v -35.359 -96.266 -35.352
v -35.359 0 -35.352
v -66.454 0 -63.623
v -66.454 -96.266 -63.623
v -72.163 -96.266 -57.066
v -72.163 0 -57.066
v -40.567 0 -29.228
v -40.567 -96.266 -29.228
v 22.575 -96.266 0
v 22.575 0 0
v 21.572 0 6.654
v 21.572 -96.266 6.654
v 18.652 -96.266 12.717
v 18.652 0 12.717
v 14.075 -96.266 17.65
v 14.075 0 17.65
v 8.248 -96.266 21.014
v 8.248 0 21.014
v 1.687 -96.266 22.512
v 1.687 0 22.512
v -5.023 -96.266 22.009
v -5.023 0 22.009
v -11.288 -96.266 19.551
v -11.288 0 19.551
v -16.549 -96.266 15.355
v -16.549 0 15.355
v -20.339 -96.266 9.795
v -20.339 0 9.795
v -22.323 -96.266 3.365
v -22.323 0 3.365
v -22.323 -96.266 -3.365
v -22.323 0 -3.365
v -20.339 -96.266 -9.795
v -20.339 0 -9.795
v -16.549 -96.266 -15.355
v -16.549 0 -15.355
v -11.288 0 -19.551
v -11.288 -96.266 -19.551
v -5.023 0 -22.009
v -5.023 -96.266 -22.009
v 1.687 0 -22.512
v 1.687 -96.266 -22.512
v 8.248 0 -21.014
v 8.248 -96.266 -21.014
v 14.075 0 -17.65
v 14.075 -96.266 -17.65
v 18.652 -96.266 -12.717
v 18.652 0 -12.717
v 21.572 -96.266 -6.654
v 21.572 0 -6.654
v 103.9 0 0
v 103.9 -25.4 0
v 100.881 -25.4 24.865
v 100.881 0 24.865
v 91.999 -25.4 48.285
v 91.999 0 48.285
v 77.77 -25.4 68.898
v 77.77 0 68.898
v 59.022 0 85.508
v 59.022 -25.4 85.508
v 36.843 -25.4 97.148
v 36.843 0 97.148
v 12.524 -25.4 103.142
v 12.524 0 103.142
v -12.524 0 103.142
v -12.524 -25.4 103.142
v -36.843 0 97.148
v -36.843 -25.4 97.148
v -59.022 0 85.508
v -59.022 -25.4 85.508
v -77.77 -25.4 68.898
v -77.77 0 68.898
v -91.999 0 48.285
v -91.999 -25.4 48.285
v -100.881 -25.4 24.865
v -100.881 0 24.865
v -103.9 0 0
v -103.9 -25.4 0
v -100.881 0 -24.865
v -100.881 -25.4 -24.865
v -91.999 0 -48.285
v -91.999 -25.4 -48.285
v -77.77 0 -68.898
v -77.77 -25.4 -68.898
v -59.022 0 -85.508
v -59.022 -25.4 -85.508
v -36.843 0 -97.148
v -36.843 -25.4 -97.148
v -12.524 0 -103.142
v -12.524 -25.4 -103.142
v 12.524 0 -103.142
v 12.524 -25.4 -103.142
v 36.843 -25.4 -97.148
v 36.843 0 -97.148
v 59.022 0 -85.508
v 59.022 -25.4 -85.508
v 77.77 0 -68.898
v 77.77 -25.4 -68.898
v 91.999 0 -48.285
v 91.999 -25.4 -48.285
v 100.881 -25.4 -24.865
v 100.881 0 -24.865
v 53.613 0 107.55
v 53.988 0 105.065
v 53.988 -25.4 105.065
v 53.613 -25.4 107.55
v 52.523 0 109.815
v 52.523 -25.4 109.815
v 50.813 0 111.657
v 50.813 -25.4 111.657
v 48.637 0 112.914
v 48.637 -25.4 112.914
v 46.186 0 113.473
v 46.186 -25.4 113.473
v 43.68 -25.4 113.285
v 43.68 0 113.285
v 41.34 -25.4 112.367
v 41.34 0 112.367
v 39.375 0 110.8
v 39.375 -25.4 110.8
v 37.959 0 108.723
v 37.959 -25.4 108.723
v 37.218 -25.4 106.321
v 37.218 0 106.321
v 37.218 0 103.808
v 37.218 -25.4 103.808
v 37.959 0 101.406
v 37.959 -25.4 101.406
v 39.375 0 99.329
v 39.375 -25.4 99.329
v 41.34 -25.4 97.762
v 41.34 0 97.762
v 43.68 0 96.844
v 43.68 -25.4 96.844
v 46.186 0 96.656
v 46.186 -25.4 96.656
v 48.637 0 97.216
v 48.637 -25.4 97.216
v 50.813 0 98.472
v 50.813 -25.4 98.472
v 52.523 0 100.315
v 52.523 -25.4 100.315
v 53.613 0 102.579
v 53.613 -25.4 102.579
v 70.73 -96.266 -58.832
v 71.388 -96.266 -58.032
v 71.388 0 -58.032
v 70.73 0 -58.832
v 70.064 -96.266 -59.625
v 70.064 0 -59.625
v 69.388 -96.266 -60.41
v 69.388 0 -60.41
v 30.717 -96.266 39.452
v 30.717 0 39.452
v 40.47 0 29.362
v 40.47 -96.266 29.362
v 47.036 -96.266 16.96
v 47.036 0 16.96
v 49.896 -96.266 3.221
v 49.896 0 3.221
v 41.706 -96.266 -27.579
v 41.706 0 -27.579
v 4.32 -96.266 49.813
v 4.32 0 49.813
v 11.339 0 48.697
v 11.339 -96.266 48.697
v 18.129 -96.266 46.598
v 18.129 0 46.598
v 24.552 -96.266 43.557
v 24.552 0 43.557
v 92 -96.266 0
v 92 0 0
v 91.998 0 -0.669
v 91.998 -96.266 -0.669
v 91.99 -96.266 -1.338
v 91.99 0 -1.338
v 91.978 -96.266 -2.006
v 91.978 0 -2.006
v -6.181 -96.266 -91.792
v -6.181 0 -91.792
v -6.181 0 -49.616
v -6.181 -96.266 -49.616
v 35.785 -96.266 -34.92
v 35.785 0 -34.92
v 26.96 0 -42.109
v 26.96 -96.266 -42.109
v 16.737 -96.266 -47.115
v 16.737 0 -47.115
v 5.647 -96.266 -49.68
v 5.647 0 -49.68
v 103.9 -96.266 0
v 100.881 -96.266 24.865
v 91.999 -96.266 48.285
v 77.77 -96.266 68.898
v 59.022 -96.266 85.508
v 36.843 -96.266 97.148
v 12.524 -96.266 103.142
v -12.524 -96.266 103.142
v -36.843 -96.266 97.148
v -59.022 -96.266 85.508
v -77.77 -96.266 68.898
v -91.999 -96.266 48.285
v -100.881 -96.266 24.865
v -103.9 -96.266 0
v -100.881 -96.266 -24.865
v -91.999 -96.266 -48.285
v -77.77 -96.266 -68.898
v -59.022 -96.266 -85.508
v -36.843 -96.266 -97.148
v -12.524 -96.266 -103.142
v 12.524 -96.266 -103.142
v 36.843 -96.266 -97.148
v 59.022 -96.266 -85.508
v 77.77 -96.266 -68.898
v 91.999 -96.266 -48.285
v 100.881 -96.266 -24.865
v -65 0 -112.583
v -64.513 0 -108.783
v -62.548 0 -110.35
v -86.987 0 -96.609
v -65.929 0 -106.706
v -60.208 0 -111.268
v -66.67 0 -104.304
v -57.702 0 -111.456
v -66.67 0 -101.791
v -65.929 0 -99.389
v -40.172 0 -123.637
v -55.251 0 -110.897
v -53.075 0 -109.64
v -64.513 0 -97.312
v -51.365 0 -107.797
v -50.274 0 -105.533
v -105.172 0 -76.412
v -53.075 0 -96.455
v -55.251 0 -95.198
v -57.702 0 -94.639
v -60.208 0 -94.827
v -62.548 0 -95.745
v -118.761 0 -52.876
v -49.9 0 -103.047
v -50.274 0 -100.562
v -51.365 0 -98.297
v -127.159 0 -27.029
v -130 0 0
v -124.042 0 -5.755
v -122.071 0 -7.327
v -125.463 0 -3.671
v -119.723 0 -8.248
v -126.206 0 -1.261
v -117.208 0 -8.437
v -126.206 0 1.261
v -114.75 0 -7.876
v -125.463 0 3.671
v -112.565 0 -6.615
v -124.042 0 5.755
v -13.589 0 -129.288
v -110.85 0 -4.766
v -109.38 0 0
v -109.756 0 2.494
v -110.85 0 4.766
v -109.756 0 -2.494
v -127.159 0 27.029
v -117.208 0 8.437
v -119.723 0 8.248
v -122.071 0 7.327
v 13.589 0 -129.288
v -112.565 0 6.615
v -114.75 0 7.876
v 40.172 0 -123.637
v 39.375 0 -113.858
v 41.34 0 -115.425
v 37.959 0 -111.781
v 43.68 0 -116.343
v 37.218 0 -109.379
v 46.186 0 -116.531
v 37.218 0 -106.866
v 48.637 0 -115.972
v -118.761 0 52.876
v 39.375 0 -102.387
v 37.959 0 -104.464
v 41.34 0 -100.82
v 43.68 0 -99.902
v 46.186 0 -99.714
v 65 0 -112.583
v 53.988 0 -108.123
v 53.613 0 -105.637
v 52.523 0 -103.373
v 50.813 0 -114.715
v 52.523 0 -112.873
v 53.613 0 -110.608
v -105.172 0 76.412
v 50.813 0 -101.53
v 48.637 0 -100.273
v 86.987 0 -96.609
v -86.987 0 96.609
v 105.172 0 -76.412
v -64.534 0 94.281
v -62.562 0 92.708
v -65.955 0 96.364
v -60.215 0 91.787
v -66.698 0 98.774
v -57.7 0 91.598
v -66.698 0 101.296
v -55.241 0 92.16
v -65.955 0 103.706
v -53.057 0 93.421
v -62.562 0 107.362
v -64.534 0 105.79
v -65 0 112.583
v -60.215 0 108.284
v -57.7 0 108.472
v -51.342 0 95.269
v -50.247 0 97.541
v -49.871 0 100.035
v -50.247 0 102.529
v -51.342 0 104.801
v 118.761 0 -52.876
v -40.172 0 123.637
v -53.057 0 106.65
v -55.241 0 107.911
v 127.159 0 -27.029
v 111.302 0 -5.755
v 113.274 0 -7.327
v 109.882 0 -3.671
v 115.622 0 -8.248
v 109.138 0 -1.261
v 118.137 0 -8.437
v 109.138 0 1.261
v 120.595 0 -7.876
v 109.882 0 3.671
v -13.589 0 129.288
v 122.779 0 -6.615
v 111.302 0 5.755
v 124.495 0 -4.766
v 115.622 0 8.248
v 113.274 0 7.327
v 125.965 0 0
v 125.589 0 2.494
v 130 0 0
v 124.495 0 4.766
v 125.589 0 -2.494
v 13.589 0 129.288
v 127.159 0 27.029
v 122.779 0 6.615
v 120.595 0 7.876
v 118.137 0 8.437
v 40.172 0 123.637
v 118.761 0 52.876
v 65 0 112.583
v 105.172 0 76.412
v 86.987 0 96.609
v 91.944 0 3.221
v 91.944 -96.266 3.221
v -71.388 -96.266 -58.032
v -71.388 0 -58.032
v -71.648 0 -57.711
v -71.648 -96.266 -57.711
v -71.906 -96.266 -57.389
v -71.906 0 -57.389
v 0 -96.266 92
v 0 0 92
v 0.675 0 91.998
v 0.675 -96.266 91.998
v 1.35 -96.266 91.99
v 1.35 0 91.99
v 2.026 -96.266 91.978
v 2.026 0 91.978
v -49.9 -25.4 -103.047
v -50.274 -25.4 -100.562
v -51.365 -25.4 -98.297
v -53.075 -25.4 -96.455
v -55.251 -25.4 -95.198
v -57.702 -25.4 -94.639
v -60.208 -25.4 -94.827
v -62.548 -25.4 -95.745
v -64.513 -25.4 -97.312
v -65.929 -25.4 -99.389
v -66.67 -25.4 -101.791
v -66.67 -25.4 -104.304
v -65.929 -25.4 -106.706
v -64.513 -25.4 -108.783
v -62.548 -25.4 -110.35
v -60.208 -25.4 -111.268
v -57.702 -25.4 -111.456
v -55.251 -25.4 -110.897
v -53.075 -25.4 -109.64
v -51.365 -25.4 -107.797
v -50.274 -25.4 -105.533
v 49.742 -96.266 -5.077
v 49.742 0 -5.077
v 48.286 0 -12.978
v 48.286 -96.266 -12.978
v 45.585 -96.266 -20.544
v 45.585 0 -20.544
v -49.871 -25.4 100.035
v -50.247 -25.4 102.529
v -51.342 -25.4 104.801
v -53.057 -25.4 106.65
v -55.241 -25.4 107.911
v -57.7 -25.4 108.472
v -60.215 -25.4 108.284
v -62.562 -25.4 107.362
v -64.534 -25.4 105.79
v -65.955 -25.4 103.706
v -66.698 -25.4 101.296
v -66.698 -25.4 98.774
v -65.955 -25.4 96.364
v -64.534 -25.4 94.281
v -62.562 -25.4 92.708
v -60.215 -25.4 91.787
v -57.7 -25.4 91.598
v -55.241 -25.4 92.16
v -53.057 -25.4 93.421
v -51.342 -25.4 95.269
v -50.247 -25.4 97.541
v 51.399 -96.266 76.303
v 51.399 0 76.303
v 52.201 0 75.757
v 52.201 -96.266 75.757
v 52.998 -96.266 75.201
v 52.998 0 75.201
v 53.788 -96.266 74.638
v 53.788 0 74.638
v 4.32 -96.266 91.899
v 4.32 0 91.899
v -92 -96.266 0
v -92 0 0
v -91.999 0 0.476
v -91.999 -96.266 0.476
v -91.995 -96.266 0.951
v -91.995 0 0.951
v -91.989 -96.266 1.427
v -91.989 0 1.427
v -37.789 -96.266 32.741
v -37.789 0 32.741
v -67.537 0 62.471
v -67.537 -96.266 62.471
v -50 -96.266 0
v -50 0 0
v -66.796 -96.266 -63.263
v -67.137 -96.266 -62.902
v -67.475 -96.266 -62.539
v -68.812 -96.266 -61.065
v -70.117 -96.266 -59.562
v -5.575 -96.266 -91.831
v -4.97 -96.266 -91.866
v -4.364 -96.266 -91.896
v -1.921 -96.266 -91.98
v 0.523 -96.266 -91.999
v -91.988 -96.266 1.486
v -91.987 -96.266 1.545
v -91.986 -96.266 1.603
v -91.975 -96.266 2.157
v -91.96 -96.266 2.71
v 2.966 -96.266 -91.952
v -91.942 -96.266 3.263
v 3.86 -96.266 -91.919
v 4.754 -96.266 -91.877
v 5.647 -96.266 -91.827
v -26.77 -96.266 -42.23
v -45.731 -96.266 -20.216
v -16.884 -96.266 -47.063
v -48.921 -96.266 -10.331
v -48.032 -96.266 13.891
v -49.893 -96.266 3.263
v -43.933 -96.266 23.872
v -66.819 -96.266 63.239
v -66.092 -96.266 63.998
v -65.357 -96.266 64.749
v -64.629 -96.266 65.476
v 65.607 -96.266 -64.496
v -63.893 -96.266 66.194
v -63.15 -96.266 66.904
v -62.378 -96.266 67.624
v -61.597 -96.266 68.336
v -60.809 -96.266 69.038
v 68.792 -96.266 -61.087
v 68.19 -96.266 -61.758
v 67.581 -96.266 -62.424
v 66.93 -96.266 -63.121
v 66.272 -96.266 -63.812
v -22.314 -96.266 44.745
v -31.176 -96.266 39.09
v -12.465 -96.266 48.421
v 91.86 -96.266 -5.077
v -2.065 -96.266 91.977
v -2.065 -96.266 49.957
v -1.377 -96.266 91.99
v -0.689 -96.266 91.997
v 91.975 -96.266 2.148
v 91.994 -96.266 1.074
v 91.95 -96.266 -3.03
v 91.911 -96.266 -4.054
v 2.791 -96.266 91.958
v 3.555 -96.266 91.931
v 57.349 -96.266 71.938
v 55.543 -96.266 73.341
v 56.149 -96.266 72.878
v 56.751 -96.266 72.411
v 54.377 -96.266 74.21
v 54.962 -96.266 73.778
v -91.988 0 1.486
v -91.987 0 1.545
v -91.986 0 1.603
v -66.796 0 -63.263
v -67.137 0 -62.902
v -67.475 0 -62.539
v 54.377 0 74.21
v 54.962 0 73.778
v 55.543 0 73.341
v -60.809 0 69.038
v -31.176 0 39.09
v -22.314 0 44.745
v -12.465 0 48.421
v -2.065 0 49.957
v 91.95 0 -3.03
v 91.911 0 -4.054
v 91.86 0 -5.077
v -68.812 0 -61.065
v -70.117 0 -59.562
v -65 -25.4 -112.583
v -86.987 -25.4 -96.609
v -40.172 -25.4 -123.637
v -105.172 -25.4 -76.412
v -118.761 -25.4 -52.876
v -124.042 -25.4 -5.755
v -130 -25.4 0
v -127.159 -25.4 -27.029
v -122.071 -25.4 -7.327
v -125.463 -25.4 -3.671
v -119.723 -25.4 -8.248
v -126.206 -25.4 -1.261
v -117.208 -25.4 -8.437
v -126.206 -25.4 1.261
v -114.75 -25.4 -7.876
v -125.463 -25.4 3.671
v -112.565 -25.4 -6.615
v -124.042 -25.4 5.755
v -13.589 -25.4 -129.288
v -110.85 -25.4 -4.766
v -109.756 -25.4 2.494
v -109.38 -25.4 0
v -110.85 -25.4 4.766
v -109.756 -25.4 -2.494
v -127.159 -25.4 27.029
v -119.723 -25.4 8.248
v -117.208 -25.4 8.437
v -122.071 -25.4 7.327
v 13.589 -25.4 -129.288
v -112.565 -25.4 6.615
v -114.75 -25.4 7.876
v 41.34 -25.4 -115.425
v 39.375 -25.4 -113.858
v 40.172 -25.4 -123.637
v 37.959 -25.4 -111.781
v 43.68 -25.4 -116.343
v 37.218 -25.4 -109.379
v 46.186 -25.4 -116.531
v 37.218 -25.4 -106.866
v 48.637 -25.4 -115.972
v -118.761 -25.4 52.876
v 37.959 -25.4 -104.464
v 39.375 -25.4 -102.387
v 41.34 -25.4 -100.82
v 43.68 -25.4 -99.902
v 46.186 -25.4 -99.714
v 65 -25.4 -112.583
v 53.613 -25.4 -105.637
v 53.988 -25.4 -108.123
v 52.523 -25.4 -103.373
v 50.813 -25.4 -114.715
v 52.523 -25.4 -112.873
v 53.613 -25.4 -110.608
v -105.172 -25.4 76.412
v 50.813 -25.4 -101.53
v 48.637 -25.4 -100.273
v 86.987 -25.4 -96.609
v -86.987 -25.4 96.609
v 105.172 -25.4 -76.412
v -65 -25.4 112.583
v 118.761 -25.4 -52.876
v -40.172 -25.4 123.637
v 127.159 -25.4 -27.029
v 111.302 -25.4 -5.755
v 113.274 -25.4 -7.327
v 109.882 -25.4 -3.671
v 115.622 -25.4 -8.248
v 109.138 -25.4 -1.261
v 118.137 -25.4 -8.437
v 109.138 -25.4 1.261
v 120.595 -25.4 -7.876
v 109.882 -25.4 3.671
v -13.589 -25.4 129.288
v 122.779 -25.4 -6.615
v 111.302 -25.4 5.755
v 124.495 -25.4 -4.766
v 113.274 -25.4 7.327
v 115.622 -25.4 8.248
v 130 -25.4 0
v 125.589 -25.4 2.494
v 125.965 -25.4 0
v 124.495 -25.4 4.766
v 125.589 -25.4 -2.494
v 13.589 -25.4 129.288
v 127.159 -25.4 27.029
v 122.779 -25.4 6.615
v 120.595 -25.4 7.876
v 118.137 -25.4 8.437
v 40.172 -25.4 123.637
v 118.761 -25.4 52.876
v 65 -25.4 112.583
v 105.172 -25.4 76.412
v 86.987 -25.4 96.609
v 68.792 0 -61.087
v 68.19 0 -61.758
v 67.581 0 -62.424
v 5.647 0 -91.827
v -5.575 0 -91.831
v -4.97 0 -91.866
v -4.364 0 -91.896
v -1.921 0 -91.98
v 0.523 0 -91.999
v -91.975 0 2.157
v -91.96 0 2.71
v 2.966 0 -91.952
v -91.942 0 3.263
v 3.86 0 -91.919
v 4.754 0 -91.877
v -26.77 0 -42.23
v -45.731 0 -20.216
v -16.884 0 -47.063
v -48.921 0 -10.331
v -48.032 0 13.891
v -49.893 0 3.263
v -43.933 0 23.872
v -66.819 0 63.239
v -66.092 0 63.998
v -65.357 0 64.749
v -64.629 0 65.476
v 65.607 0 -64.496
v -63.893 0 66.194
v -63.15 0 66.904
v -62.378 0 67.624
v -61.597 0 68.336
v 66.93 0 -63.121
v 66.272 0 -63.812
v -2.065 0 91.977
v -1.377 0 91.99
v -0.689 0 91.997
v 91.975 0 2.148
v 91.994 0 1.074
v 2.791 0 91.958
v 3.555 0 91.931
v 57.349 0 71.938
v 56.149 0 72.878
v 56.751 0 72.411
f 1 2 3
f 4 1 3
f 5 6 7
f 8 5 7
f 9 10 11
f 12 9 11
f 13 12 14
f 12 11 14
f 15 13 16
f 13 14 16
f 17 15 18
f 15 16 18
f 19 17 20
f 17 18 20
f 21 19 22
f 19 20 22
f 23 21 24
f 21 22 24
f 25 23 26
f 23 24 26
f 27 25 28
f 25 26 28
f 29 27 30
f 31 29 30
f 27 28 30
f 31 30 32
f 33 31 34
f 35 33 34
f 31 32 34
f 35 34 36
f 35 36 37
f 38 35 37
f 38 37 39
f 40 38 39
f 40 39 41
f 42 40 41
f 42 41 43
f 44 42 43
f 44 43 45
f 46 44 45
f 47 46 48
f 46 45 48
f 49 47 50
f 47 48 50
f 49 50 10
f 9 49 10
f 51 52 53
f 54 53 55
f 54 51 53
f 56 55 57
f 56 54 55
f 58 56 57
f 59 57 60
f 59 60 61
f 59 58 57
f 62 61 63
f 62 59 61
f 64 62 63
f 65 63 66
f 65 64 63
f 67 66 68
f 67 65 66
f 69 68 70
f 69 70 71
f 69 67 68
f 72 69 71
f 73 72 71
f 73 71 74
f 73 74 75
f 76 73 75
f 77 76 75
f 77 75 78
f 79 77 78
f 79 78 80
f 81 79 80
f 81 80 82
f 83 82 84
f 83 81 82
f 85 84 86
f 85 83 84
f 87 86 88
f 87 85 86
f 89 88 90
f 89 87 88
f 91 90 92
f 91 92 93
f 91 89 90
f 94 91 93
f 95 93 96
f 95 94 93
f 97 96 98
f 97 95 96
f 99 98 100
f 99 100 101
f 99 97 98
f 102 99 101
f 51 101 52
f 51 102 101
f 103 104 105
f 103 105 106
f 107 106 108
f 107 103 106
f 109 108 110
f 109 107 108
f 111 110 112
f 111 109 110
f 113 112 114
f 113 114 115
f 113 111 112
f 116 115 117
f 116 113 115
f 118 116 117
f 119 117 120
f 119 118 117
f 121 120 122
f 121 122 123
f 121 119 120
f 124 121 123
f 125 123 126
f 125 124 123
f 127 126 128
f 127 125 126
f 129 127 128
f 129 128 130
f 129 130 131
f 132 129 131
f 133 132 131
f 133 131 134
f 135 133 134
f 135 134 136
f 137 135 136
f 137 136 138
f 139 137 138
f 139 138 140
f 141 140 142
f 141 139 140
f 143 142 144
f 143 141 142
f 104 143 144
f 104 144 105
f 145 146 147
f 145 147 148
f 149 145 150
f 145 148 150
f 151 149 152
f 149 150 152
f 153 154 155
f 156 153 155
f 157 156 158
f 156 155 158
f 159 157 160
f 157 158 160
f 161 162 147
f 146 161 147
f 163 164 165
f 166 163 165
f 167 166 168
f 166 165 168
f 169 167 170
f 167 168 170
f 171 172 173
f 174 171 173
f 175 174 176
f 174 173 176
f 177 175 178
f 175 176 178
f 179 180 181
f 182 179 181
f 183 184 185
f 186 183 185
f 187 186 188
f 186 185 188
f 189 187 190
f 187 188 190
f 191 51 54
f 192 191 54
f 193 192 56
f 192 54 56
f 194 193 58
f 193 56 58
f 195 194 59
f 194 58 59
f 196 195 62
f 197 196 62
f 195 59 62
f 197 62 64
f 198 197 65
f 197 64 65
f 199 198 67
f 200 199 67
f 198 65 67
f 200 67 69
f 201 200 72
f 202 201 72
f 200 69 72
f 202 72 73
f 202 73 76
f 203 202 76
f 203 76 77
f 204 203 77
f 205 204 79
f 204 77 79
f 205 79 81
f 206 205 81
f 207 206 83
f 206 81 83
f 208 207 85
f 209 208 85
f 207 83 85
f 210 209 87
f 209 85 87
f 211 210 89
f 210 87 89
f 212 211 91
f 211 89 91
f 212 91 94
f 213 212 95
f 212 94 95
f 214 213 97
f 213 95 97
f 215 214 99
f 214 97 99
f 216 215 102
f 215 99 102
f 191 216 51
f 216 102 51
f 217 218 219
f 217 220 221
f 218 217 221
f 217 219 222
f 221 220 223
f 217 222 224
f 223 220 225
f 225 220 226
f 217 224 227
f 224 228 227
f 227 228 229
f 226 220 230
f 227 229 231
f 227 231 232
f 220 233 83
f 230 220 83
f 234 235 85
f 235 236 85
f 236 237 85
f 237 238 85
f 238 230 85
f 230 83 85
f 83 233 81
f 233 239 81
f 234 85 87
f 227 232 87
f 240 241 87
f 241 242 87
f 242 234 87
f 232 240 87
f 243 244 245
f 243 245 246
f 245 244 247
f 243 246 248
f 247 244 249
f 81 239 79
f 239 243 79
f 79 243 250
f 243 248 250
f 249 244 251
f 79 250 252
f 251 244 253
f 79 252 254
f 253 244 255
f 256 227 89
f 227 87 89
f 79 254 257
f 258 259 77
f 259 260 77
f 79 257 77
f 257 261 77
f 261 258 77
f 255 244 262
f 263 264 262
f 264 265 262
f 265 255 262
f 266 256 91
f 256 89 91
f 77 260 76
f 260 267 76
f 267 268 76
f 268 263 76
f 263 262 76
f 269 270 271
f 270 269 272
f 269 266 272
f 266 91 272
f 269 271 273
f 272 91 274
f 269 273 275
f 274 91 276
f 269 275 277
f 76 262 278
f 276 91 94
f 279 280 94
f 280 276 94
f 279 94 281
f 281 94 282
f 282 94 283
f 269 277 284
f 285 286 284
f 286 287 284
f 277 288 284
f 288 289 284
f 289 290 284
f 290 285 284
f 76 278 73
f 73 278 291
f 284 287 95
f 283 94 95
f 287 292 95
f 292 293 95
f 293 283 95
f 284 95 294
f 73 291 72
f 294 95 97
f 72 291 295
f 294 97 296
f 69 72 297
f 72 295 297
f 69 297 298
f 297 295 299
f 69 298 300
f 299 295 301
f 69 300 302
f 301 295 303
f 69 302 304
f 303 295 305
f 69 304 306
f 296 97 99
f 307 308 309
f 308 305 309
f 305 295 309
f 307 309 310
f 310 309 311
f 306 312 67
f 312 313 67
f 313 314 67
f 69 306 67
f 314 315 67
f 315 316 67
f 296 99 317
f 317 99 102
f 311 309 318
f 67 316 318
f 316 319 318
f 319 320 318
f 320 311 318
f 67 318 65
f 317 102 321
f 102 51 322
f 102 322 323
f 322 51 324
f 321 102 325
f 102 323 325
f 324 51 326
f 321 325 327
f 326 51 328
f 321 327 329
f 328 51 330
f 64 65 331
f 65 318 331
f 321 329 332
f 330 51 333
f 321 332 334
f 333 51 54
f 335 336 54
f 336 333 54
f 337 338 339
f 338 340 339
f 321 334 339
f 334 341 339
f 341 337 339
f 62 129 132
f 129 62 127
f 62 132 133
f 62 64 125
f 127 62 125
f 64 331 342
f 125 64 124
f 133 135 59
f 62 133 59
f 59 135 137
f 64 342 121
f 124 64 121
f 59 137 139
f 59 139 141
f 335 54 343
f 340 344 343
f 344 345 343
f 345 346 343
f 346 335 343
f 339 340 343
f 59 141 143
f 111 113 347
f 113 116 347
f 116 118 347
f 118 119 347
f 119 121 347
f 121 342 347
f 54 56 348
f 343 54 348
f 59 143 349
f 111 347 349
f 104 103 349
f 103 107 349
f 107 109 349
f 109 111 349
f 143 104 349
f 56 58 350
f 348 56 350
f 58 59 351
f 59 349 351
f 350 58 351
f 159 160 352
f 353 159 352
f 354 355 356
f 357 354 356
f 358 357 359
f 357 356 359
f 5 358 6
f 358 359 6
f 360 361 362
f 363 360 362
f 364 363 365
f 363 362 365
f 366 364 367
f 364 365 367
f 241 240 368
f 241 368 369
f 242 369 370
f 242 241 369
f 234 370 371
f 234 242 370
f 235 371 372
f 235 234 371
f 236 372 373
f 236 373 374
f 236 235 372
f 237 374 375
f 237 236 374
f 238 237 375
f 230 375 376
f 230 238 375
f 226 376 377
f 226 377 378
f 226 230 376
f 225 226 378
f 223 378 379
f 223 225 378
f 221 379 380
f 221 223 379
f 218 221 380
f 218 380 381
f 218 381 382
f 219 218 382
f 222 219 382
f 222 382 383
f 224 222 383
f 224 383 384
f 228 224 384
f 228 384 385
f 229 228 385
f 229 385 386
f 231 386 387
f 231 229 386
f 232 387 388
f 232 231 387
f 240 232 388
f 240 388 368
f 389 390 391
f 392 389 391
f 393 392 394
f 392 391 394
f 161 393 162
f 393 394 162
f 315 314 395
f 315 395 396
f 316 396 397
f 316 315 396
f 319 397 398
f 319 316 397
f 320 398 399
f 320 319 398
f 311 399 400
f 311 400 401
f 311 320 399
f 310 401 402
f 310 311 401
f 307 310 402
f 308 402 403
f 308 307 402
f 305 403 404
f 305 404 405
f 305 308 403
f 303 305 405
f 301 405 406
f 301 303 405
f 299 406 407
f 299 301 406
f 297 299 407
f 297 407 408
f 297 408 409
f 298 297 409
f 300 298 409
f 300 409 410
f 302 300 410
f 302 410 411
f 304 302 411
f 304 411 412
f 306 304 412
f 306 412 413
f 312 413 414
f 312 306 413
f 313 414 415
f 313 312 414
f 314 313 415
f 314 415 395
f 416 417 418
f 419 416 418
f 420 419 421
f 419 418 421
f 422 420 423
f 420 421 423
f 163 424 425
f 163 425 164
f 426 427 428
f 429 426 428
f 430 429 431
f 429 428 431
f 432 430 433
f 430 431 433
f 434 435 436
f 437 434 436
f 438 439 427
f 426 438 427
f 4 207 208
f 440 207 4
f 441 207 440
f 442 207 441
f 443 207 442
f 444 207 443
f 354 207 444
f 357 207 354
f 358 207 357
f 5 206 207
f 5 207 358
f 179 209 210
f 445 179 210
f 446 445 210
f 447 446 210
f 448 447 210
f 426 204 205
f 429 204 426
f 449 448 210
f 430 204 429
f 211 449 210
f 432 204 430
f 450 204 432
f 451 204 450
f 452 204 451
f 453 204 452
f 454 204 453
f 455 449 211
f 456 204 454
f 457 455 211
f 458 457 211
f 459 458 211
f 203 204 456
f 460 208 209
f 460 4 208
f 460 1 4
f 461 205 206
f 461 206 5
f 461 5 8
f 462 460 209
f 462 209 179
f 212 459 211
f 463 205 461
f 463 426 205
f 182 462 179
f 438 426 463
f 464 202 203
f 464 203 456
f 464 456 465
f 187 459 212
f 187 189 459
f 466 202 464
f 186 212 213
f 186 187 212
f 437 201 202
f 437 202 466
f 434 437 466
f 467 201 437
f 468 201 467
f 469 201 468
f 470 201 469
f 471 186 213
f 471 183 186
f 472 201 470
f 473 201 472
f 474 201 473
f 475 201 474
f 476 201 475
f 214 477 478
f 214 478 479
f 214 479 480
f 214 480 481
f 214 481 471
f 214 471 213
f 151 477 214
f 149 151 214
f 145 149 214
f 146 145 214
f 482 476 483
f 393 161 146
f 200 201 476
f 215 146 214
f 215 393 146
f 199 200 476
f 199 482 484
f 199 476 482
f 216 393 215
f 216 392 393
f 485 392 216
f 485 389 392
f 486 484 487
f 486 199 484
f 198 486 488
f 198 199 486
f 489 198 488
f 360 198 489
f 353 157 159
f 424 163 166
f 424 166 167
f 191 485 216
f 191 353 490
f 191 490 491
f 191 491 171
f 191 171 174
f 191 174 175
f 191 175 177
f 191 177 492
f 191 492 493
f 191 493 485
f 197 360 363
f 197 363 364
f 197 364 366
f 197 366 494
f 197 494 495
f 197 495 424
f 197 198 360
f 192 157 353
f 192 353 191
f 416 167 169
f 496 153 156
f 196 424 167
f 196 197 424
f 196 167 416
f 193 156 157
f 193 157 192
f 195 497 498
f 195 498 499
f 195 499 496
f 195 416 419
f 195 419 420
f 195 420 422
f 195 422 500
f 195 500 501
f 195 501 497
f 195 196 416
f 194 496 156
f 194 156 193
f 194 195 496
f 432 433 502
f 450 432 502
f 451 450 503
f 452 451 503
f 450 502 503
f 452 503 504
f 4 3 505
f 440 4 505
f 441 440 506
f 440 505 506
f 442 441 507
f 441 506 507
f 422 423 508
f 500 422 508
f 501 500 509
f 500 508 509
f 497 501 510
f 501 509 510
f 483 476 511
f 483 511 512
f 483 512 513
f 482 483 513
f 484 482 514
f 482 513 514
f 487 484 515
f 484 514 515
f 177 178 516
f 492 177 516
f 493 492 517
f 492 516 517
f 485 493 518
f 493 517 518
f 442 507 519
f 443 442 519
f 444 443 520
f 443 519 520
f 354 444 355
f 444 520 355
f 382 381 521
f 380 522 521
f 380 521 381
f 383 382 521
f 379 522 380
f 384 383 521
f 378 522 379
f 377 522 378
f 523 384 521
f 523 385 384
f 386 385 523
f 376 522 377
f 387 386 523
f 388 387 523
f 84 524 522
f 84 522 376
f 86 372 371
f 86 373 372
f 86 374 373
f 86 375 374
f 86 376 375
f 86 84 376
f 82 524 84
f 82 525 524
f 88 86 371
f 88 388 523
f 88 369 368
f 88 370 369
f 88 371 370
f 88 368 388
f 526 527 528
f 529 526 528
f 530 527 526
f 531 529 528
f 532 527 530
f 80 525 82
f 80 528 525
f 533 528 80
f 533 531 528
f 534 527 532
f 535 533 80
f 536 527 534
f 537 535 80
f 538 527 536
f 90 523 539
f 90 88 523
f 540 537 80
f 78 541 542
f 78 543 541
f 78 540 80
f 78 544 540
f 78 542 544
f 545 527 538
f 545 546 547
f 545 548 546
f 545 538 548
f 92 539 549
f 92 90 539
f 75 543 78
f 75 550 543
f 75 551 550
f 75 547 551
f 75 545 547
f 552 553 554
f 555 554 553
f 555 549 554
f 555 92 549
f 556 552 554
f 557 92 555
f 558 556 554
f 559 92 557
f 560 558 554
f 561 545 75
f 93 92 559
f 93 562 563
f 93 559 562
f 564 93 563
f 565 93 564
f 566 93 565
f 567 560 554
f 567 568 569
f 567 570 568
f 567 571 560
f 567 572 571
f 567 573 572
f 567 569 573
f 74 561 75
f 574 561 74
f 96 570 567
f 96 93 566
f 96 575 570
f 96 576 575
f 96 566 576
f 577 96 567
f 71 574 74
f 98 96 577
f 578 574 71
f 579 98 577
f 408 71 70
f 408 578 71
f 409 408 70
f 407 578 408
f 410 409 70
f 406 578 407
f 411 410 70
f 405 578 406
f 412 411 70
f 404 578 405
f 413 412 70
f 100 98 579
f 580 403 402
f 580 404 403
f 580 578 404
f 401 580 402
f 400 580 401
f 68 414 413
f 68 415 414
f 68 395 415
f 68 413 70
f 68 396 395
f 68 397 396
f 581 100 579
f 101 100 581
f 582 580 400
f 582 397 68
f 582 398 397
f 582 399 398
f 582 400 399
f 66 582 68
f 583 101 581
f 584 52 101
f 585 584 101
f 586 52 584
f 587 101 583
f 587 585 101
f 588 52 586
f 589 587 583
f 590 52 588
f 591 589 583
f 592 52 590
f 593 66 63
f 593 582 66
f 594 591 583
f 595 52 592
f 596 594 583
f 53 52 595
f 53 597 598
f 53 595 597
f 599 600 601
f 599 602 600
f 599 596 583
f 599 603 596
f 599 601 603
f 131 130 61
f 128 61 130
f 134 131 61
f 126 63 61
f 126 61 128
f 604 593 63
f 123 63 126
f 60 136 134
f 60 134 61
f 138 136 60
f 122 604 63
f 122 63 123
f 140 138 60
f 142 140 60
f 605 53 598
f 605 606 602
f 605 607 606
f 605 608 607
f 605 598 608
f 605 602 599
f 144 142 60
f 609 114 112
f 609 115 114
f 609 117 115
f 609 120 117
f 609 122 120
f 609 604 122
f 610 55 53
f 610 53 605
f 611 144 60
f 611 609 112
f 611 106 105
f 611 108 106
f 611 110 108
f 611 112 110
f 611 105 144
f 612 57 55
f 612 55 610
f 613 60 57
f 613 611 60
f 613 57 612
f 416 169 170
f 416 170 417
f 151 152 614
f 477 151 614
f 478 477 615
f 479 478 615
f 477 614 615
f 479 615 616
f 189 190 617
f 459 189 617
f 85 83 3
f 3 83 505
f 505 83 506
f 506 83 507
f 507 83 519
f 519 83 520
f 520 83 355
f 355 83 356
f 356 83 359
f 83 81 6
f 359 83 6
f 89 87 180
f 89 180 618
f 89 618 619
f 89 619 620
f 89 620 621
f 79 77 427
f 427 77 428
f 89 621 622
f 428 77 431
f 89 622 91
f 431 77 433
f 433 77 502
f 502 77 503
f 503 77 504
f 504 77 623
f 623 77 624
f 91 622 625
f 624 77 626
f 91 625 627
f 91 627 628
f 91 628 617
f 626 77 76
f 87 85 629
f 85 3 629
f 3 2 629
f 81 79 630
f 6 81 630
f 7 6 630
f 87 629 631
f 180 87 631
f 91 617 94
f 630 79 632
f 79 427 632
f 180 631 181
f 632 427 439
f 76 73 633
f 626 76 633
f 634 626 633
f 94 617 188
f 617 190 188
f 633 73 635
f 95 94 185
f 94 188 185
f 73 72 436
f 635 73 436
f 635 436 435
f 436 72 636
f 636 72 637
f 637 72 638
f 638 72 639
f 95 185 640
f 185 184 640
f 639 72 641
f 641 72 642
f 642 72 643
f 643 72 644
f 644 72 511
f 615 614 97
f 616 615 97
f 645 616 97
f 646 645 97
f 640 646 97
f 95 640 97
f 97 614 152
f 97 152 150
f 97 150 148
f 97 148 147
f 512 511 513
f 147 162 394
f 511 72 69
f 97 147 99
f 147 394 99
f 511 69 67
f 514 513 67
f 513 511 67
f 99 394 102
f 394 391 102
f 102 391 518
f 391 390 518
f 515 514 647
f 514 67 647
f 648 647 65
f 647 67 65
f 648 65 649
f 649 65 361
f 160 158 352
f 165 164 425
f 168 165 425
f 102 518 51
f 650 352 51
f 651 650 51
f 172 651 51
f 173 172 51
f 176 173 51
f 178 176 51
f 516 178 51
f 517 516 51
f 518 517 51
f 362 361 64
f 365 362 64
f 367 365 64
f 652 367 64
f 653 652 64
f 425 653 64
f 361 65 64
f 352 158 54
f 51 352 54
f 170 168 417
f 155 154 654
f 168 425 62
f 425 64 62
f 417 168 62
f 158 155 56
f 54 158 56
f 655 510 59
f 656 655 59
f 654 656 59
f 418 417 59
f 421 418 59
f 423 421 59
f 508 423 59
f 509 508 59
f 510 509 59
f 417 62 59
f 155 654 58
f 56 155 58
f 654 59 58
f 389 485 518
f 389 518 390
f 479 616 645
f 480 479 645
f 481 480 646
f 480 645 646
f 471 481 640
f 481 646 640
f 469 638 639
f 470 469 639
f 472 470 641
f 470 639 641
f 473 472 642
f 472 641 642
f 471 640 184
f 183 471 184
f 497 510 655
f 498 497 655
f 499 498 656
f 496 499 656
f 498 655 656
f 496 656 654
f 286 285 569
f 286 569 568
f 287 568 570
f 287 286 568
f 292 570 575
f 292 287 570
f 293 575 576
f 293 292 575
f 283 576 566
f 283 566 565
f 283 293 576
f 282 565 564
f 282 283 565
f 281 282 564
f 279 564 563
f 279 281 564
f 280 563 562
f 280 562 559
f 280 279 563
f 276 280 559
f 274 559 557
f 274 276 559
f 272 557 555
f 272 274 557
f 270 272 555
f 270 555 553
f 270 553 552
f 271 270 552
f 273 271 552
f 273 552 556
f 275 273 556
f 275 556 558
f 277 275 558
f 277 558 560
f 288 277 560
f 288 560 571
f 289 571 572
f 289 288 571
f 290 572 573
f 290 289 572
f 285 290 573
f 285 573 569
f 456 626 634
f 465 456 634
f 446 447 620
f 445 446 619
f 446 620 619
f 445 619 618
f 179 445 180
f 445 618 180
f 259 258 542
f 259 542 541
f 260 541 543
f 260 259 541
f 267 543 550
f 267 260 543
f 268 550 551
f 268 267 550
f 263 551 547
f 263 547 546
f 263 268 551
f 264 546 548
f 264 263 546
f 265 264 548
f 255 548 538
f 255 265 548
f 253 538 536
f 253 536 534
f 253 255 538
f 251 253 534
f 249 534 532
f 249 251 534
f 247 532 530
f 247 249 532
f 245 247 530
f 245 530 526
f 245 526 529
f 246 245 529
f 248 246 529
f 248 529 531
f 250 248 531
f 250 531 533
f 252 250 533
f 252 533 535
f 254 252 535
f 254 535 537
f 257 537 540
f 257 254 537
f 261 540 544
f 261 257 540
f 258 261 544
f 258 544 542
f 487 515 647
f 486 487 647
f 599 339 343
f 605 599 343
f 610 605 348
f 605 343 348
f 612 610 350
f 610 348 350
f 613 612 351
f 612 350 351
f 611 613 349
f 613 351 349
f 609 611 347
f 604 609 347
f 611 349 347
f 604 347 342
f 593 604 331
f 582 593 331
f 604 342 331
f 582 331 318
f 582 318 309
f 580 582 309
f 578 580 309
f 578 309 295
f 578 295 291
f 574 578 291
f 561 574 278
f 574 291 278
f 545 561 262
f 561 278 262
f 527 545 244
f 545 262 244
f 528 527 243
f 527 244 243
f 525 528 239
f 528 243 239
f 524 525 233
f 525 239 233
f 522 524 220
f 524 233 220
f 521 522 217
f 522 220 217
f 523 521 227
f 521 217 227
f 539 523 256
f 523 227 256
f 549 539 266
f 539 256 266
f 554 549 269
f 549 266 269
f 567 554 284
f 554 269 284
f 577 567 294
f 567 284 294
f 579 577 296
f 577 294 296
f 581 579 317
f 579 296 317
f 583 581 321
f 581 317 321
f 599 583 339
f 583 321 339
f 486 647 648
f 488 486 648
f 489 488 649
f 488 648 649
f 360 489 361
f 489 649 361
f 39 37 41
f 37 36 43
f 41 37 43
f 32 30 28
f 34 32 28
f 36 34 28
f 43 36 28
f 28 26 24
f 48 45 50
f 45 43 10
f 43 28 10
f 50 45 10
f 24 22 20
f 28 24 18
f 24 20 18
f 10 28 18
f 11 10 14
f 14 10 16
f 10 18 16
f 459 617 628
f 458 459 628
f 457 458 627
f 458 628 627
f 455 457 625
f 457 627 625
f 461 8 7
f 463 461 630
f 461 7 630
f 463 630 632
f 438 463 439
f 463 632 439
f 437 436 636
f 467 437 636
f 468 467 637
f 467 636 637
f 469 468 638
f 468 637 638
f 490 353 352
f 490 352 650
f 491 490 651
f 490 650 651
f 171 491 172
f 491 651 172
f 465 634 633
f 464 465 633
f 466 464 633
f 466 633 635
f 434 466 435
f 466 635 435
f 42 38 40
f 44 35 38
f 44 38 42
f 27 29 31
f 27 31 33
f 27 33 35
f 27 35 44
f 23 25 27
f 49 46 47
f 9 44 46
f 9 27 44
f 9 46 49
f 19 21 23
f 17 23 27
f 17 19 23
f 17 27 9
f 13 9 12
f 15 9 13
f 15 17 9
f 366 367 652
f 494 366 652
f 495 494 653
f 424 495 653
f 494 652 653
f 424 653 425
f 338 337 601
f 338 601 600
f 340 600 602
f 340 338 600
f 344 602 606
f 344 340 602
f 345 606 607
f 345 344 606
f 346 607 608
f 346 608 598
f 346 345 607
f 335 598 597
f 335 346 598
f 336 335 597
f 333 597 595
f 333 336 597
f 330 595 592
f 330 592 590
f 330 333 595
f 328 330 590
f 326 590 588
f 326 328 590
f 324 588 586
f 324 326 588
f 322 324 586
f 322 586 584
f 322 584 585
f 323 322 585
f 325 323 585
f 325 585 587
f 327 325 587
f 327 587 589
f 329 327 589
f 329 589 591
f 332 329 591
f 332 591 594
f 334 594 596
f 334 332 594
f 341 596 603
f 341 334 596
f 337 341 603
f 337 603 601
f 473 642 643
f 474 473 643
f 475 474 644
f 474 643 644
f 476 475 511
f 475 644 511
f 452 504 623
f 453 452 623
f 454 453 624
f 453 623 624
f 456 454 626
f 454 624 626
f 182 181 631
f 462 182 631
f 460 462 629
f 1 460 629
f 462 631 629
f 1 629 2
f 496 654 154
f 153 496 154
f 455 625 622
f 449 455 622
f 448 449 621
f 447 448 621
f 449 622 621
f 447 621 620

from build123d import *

# Parameters (mm, degrees)
F0_R     = 130
F0_R_2   = 8.4320247837
F0_R_3   = 8.4604664224
F0_R_4   = 103.9
F1_DEPTH = 25.4
F0_R_5   = 22.575
F2_DEPTH = 96.266
F0_R_6   = 100


with BuildPart() as f1:
    # F0 (on Front) → F1 (new body)
    with BuildSketch(Plane.XZ):
        Circle(F0_R)
        with Locations((-58.3318956196, -103.0474081635)):
            Circle(F0_R_2, mode=Mode.SUBTRACT)
        with Locations((45.5560311675, -108.1225928525)):
            Circle(F0_R_2, mode=Mode.SUBTRACT)
        with Locations((-117.840513587, 0)):
            Circle(F0_R_3, mode=Mode.SUBTRACT)
        with Locations((-58.3318956196, 100.035185645)):
            Circle(F0_R_3, mode=Mode.SUBTRACT)
        Circle(F0_R_4, mode=Mode.SUBTRACT)
        with Locations((117.5043061376, 0)):
            Circle(F0_R_3, mode=Mode.SUBTRACT)
        with Locations((45.5560311675, 105.0646528602)):
            Circle(F0_R_2, mode=Mode.SUBTRACT)
    extrude(amount=F1_DEPTH)


with BuildPart() as f2:
    # F0 (on Front) → F2 (new body)
    with BuildSketch(Plane.XZ):
        Circle(F0_R_5)
    extrude(amount=F2_DEPTH)


with BuildPart() as f2b:
    # F0 (on Front) → F2, piece 2 (new body)
    with BuildSketch(Plane.XZ):
        Circle(F0_R_4)
        Circle(F0_R_6, mode=Mode.SUBTRACT)
        Circle(F0_R_6)
        with BuildLine():
            ThreePointArc((91.943598503, 3.2209772296), (91.985898545, 1.610735503), (92, 0))
            ThreePointArc((92, 0), (91.9945302976, -1.0031925668), (91.9781218407, -2.0062658473))
            ThreePointArc((91.9781218407, -2.0062658473), (91.931784088, -3.5421849738), (91.8598002052, -5.07711594))
            ThreePointArc((91.8598002052, -5.07711594), (85.8110621158, -33.1732063352), (71.3882681475, -58.0320184976))
            ThreePointArc((71.3882681475, -58.0320184976), (70.398114687, -59.2292617591), (69.3878848277, -60.4096137973))
            ThreePointArc((69.3878848277, -60.4096137973), (68.4920226657, -61.4234713376), (67.5813480023, -62.4240450643))
            ThreePointArc((67.5813480023, -62.4240450643), (66.6023552591, -63.4675214101), (65.6072527589, -64.4956462517))
            ThreePointArc((65.6072527589, -64.4956462517), (38.1579577102, -83.7136205368), (5.6468078972, -91.8265406109))
            ThreePointArc((5.6468078972, -91.8265406109), (4.3070182777, -91.8991272731), (2.9663125492, -91.9521668579))
            ThreePointArc((2.9663125492, -91.9521668579), (-0.6992703547, -91.9973424669), (-4.3637430068, -91.8964512208))
            ThreePointArc((-4.3637430068, -91.8964512208), (-5.2725828132, -91.848788073), (-6.1809066605, -91.7921368792))
            ThreePointArc((-6.1809066605, -91.7921368792), (-38.9531507817, -83.3465778792), (-66.4542592722, -63.6225700879))
            ThreePointArc((-66.4542592722, -63.6225700879), (-66.9668049503, -63.0828584859), (-67.4749674699, -62.5390179402))
            ThreePointArc((-67.4749674699, -62.5390179402), (-69.4682529705, -60.3171769003), (-71.3884116058, -58.0318420214))
            ThreePointArc((-71.3884116058, -58.0318420214), (-71.77720849, -57.5502592643), (-72.1627567009, -57.066071753))
            ThreePointArc((-72.1627567009, -57.066071753), (-86.6327457977, -30.963968666), (-91.9860266314, -1.6034040539))
            ThreePointArc((-91.9860266314, -1.6034040539), (-91.9965065915, -0.8017324702), (-92, 0))
            ThreePointArc((-92, 0), (-91.9972330765, 0.7135168314), (-91.9889324724, 1.4269907443))
            ThreePointArc((-91.9889324724, 1.4269907443), (-91.9875218425, 1.5151980957), (-91.9860266314, 1.6034040539))
            ThreePointArc((-91.9860266314, 1.6034040539), (-91.9678157166, 2.4332842667), (-91.9421179347, 3.2629663919))
            ThreePointArc((-91.9421179347, 3.2629663919), (-85.0579145918, 35.0592522066), (-67.5374918971, 62.4714910039))
            ThreePointArc((-67.5374918971, 62.4714910039), (-66.4569448496, 63.6197648632), (-65.3568775289, 64.7493518089))
            ThreePointArc((-65.3568775289, 64.7493518089), (-64.2622258258, 65.8359045804), (-63.1495128287, 66.9039537658))
            ThreePointArc((-63.1495128287, 66.9039537658), (-61.988450086, 67.9811154361), (-60.8090167909, 69.0381306013))
            ThreePointArc((-60.8090167909, 69.0381306013), (-33.4640730256, 85.6980502494), (-2.0654104118, 91.9768127292))
            ThreePointArc((-2.0654104118, 91.9768127292), (-1.0327702817, 91.9942029997), (0, 92))
            ThreePointArc((0, 92), (1.0128581982, 91.9944243869), (2.0255936289, 91.9776982233))
            ThreePointArc((2.0255936289, 91.9776982233), (3.1729894719, 91.9452670767), (4.3198913837, 91.8985230482))
            ThreePointArc((4.3198913837, 91.8985230482), (28.9299356948, 87.3330339602), (51.3986111458, 76.3032291078))
            ThreePointArc((51.3986111458, 76.3032291078), (52.6000832749, 75.4800055609), (53.7883728669, 74.6378653522))
            ThreePointArc((53.7883728669, 74.6378653522), (54.6697457556, 73.9947221024), (55.5434294104, 73.3411715841))
            ThreePointArc((55.5434294104, 73.3411715841), (56.4507085305, 72.6451478518), (57.3492665734, 71.9379011613))
            ThreePointArc((57.3492665734, 71.9379011613), (82.1741674697, 41.3691455152), (91.943598503, 3.2209772296))
        make_face(mode=Mode.SUBTRACT)
        with BuildLine():
            ThreePointArc((30.7168600193, 39.4521800482), (44.190374144, 23.3925379771), (49.8961451987, 3.2209772296))
            Line((49.8961451987, 3.2209772296), (91.943598503, 3.2209772296))
            ThreePointArc((91.943598503, 3.2209772296), (82.1741674697, 41.3691455152), (57.3492665734, 71.9379011613))
            Line((57.3492665734, 71.9379011613), (30.7168600193, 39.4521800482))
        make_face()
        with BuildLine():
            Line((65.6072527589, -64.4956462517), (35.7854787982, -34.9199013055))
            ThreePointArc((35.7854787982, -34.9199013055), (21.9914654476, -44.9040693865), (5.6468078972, -49.6801123245))
            Line((5.6468078972, -49.6801123245), (5.6468078972, -91.8265406109))
            ThreePointArc((5.6468078972, -91.8265406109), (38.1579577102, -83.7136205368), (65.6072527589, -64.4956462517))
        make_face()
        with BuildLine():
            Line((-6.1809066605, -91.7921368792), (-6.1809066605, -49.6164931535))
            ThreePointArc((-6.1809066605, -49.6164931535), (-21.9605262736, -44.9192084279), (-35.3590900652, -35.3515876554))
            Line((-35.3590900652, -35.3515876554), (-66.4542592722, -63.6225700879))
            ThreePointArc((-66.4542592722, -63.6225700879), (-38.9531507817, -83.3465778792), (-6.1809066605, -91.7921368792))
        make_face()
        with BuildLine():
            ThreePointArc((-49.8934169037, 3.2629663919), (-46.252497704, 18.9922735907), (-37.7889712211, 32.7413141772))
            Line((-37.7889712211, 32.7413141772), (-67.5374918971, 62.4714910039))
            ThreePointArc((-67.5374918971, 62.4714910039), (-85.0579145918, 35.0592522066), (-91.9421179347, 3.2629663919))
            Line((-91.9421179347, 3.2629663919), (-49.8934169037, 3.2629663919))
        make_face()
        with BuildLine():
            ThreePointArc((-31.1759395801, 39.090418152), (-17.4862586138, 46.8426169176), (-2.0654104118, 49.9573225847))
            Line((-2.0654104118, 49.9573225847), (-2.0654104118, 91.9768127292))
            ThreePointArc((-2.0654104118, 91.9768127292), (-33.4640730256, 85.6980502494), (-60.8090167909, 69.0381306013))
            Line((-60.8090167909, 69.0381306013), (-31.1759395801, 39.090418152))
        make_face()
        with BuildLine():
            Line((-72.1627567009, -57.066071753), (-40.5672940167, -29.2283194208))
            ThreePointArc((-40.5672940167, -29.2283194208), (-47.5834251648, -15.3563553483), (-50, 0))
            Line((-50, 0), (-92, 0))
            ThreePointArc((-92, 0), (-91.9965065915, -0.8017324702), (-91.9860266314, -1.6034040539))
            ThreePointArc((-91.9860266314, -1.6034040539), (-86.6327457977, -30.963968666), (-72.1627567009, -57.066071753))
        make_face()
        with BuildLine():
            Line((91.8598002052, -5.07711594), (49.7415610303, -5.07711594))
            ThreePointArc((49.7415610303, -5.07711594), (47.0876847242, -16.8151701541), (41.7060192908, -27.5791217213))
            Line((41.7060192908, -27.5791217213), (71.3882681475, -58.0320184976))
            ThreePointArc((71.3882681475, -58.0320184976), (85.8110621158, -33.1732063352), (91.8598002052, -5.07711594))
        make_face()
        with BuildLine():
            ThreePointArc((4.3198913837, 49.8130358283), (14.7711602976, 47.7683244783), (24.552351085, 43.5566534091))
            Line((24.552351085, 43.5566534091), (51.3986111458, 76.3032291078))
            ThreePointArc((51.3986111458, 76.3032291078), (28.9299356948, 87.3330339602), (4.3198913837, 91.8985230482))
            Line((4.3198913837, 91.8985230482), (4.3198913837, 49.8130358283))
        make_face()
    extrude(amount=F2_DEPTH)


solid = Compound([f1.part, f2.part, f2b.part])
